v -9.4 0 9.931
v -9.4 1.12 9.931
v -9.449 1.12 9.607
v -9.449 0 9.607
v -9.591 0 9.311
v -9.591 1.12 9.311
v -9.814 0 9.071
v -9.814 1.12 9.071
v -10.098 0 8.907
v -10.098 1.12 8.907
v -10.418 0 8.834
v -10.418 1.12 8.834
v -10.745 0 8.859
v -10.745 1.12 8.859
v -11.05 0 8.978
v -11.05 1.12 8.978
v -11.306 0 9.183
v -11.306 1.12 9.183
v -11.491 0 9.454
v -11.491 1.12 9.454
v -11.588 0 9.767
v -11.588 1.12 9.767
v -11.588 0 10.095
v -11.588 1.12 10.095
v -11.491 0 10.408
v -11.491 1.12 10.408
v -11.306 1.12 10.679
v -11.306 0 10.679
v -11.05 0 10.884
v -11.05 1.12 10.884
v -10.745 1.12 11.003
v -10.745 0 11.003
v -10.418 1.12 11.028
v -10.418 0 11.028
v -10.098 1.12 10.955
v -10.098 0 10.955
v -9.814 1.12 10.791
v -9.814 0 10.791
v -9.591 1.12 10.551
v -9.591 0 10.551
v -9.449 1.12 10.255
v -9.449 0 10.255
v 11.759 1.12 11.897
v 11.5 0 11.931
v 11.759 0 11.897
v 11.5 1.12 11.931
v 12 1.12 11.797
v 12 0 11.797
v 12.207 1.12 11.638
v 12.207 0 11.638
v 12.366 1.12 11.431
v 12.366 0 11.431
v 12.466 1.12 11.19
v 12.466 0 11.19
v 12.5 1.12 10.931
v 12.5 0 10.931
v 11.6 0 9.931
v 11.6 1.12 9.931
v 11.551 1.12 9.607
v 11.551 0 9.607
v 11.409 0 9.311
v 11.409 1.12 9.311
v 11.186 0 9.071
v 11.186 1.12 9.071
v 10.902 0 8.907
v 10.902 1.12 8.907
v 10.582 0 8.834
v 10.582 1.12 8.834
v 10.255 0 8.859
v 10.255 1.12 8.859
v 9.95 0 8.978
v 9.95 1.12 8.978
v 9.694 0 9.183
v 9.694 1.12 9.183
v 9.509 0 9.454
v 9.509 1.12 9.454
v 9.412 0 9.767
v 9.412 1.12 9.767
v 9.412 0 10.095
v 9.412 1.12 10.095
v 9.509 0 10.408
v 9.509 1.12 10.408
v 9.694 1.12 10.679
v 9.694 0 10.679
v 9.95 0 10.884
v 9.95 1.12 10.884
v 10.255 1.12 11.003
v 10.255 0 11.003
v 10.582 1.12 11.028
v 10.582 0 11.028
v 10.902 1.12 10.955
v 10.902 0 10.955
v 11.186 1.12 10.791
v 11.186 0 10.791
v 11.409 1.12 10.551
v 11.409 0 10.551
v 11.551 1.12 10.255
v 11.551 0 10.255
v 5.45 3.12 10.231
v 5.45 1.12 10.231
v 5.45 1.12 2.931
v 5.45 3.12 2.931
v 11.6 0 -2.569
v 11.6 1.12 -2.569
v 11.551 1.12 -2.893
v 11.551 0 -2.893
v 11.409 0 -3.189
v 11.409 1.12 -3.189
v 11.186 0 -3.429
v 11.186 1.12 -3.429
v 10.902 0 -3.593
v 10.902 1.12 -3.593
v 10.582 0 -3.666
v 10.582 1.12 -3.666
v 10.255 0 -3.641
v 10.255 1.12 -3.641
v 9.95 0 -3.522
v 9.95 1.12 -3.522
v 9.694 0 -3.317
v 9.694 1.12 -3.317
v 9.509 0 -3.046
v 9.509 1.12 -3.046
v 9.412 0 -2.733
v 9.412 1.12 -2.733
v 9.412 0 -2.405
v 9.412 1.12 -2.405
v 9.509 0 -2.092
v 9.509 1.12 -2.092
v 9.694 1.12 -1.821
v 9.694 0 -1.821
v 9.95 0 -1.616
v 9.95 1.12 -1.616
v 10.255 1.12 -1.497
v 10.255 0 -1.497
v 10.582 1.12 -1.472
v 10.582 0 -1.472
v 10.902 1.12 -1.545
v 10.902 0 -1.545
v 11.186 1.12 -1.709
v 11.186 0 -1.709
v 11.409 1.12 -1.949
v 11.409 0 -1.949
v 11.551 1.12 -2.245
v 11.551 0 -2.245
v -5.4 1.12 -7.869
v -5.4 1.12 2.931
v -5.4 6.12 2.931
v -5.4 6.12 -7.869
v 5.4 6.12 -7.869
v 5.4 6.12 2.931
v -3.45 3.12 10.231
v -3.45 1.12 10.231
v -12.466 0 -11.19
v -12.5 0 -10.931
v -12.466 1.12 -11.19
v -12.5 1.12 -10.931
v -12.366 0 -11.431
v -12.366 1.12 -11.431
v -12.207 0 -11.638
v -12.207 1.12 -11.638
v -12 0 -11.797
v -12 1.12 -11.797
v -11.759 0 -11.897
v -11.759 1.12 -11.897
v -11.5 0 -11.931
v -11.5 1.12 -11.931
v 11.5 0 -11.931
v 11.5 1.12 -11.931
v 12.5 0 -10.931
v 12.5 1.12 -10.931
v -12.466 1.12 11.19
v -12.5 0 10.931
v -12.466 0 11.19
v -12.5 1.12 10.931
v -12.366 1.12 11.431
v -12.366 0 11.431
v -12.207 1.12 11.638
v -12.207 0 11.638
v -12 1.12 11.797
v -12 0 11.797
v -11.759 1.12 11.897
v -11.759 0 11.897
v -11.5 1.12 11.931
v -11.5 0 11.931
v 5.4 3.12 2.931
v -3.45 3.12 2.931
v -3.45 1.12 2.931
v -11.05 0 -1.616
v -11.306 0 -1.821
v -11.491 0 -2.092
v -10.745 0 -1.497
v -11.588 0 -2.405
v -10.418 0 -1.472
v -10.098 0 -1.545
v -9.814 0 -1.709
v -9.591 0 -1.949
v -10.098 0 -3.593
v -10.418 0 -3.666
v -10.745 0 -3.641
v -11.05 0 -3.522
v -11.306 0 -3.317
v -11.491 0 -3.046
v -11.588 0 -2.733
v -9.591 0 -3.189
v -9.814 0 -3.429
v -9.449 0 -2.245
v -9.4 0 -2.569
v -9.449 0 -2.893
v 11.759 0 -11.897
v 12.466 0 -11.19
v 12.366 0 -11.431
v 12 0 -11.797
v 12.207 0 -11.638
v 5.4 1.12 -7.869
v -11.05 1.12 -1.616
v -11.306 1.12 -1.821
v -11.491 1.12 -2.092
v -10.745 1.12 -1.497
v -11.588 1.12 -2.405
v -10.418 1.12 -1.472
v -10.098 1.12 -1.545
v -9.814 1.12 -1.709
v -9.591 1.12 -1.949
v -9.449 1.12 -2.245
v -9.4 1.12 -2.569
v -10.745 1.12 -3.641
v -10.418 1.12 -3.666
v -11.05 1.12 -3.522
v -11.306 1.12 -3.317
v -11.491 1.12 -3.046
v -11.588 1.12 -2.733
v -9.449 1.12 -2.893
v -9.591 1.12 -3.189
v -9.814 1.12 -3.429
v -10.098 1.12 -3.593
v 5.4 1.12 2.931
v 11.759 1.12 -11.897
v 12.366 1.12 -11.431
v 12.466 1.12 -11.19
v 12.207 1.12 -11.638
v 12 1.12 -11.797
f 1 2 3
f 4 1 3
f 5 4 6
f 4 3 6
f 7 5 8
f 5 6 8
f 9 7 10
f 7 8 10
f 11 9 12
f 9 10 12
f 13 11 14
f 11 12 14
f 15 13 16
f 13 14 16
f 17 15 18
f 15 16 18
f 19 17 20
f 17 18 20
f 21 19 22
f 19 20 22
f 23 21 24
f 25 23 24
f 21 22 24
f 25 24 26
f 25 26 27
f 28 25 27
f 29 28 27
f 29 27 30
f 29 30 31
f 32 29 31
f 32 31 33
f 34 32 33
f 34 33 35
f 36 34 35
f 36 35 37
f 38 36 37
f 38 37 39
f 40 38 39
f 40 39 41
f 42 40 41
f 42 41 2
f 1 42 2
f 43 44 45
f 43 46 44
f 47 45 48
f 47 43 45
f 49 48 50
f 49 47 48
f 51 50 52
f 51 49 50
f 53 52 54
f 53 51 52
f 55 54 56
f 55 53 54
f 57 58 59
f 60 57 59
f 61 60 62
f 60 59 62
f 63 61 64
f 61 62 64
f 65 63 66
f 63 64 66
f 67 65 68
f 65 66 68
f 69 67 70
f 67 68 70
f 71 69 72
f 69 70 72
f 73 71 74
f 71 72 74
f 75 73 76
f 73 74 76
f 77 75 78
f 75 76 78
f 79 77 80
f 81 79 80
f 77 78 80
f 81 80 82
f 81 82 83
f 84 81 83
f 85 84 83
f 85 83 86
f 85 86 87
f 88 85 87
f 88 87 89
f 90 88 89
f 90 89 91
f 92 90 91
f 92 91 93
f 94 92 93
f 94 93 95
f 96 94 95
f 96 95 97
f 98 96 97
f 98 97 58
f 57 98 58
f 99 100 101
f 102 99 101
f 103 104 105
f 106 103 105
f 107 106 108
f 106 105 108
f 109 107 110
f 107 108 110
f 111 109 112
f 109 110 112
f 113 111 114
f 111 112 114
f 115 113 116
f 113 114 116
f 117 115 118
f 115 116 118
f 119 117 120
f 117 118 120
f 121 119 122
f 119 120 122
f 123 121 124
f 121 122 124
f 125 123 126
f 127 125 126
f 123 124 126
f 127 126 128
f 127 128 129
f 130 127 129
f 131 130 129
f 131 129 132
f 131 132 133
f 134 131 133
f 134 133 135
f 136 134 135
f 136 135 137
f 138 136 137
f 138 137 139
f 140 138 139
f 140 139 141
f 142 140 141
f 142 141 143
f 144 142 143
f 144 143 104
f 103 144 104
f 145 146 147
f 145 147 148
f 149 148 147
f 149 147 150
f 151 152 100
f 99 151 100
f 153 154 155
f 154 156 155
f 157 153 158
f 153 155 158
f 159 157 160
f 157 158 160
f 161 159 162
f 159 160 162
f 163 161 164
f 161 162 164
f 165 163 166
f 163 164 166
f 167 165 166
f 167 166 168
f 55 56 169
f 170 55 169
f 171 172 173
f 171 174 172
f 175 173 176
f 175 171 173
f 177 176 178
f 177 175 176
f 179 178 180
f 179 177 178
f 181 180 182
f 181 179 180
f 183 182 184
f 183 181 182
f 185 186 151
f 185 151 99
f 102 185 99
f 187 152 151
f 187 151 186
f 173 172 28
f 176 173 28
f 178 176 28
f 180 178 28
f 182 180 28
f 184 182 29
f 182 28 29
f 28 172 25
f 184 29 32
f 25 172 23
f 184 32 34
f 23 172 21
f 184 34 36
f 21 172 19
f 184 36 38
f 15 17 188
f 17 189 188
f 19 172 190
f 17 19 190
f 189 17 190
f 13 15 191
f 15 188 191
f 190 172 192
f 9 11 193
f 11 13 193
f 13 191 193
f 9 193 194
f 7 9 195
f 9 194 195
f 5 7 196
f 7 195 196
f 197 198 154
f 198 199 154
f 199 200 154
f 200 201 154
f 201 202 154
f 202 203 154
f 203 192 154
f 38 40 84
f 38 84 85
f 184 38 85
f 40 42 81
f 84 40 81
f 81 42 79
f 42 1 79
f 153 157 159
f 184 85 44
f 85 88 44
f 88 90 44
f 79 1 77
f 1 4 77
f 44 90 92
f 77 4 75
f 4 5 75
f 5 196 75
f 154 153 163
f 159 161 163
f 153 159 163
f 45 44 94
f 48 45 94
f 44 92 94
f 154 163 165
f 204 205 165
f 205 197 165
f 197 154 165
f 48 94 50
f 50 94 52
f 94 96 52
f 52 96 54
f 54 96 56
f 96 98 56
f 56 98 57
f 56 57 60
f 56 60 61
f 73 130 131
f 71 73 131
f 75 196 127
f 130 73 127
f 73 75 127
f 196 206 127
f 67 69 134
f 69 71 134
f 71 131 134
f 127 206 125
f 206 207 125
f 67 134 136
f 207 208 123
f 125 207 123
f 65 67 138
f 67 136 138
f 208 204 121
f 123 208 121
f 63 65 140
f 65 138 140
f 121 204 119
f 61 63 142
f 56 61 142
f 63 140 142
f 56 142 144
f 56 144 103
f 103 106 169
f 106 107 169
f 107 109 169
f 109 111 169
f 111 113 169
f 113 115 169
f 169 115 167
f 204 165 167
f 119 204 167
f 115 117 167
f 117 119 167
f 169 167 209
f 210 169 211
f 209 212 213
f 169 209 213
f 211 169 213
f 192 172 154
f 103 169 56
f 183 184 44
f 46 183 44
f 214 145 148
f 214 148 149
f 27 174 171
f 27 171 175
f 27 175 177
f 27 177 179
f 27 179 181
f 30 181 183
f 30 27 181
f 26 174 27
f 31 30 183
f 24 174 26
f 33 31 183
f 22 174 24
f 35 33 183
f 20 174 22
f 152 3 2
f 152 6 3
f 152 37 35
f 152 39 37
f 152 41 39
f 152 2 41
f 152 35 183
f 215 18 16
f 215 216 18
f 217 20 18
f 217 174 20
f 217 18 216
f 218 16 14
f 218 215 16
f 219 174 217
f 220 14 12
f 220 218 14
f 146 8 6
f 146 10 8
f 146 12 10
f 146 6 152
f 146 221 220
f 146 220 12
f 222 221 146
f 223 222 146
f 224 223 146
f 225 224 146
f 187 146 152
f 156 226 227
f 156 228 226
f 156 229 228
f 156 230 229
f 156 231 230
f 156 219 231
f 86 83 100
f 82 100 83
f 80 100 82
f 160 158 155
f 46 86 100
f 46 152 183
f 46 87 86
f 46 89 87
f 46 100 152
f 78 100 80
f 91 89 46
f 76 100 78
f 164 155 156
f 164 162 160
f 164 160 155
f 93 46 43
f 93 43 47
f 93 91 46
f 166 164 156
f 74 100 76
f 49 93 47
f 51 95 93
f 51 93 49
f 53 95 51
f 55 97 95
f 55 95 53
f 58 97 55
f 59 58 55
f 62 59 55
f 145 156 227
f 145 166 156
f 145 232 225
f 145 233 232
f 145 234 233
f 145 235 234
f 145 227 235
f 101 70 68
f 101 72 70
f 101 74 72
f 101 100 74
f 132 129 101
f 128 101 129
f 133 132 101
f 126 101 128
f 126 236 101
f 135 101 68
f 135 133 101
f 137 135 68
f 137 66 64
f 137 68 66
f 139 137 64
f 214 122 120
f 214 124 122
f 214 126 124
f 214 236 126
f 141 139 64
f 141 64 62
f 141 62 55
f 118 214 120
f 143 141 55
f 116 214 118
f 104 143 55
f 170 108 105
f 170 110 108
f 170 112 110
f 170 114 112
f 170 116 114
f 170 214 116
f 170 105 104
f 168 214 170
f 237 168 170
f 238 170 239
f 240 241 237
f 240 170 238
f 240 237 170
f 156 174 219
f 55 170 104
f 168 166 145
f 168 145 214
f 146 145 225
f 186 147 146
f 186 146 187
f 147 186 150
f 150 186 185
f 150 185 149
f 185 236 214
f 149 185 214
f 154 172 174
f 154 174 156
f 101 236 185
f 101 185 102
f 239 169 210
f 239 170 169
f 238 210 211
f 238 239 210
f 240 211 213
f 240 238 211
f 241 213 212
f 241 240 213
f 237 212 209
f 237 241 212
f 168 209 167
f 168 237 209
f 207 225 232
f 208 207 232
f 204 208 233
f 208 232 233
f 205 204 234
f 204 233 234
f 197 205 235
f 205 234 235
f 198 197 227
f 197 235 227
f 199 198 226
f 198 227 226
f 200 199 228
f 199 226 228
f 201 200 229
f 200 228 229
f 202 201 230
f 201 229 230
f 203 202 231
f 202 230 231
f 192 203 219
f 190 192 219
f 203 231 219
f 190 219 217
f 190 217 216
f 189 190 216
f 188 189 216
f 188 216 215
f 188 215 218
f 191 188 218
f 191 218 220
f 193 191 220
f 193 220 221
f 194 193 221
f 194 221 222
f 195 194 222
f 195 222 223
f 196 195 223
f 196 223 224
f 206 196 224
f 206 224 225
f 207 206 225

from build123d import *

# Parameters (mm, degrees)
SKETCH1_W           = 25
SKETCH1_H           = 23.862
BOSS_EXTRUDE1_DEPTH = 1.12
FILLET1_R           = 1
SKETCH2_R           = 1.1
CUT_EXTRUDE1_DEPTH  = 2
SKETCH3_W           = 10.8
SKETCH3_H           = 10.8
BOSS_EXTRUDE2_DEPTH = 5
SKETCH4_W           = 8.9
SKETCH4_H           = 7.3
BOSS_EXTRUDE3_DEPTH = 2


with BuildPart() as part:
    # Sketch1 → Boss-Extrude1 (new body)
    with BuildSketch(Plane(origin=(0, 0, 0), x_dir=(1, 0, 0), z_dir=(0, 1, 0))):
        Rectangle(SKETCH1_W, SKETCH1_H)
    extrude(amount=BOSS_EXTRUDE1_DEPTH)

    # Fillet1
    fillet1_edges = [part.edges().sort_by_distance(p)[0] for p in [
        (-12.5, 0.56, -11.931),
        (12.5, 0.56, -11.931),
        (12.5, 0.56, 11.931),
        (-12.5, 0.56, 11.931),
    ]]
    fillet(fillet1_edges, radius=FILLET1_R)

    # Sketch2 → Cut-Extrude1 (cut)
    with BuildSketch(Plane(origin=(0, 1.12, 0), x_dir=(1, 0, 0), z_dir=(0, 1, 0))):
        with Locations((-10.5, 2.569)):
            Circle(SKETCH2_R)
        with Locations((10.5, 2.569)):
            Circle(SKETCH2_R)
        with Locations((-10.5, -9.931)):
            Circle(SKETCH2_R)
        with Locations((10.5, -9.931)):
            Circle(SKETCH2_R)
    extrude(amount=-CUT_EXTRUDE1_DEPTH, mode=Mode.SUBTRACT)

    # Sketch3 → Boss-Extrude2 (add)
    with BuildSketch(Plane(origin=(0, 1.12, 0), x_dir=(1, 0, 0), z_dir=(0, 1, 0))):
        with Locations((0, 2.469)):
            Rectangle(SKETCH3_W, SKETCH3_H)
    extrude(amount=BOSS_EXTRUDE2_DEPTH)

    # Sketch4 → Boss-Extrude3 (add)
    with BuildSketch(Plane(origin=(0, 1.12, 0), x_dir=(1, 0, 0), z_dir=(0, 1, 0))):
        with Locations((1, -6.581)):
            Rectangle(SKETCH4_W, SKETCH4_H)
    extrude(amount=BOSS_EXTRUDE3_DEPTH)


solid = part.part
